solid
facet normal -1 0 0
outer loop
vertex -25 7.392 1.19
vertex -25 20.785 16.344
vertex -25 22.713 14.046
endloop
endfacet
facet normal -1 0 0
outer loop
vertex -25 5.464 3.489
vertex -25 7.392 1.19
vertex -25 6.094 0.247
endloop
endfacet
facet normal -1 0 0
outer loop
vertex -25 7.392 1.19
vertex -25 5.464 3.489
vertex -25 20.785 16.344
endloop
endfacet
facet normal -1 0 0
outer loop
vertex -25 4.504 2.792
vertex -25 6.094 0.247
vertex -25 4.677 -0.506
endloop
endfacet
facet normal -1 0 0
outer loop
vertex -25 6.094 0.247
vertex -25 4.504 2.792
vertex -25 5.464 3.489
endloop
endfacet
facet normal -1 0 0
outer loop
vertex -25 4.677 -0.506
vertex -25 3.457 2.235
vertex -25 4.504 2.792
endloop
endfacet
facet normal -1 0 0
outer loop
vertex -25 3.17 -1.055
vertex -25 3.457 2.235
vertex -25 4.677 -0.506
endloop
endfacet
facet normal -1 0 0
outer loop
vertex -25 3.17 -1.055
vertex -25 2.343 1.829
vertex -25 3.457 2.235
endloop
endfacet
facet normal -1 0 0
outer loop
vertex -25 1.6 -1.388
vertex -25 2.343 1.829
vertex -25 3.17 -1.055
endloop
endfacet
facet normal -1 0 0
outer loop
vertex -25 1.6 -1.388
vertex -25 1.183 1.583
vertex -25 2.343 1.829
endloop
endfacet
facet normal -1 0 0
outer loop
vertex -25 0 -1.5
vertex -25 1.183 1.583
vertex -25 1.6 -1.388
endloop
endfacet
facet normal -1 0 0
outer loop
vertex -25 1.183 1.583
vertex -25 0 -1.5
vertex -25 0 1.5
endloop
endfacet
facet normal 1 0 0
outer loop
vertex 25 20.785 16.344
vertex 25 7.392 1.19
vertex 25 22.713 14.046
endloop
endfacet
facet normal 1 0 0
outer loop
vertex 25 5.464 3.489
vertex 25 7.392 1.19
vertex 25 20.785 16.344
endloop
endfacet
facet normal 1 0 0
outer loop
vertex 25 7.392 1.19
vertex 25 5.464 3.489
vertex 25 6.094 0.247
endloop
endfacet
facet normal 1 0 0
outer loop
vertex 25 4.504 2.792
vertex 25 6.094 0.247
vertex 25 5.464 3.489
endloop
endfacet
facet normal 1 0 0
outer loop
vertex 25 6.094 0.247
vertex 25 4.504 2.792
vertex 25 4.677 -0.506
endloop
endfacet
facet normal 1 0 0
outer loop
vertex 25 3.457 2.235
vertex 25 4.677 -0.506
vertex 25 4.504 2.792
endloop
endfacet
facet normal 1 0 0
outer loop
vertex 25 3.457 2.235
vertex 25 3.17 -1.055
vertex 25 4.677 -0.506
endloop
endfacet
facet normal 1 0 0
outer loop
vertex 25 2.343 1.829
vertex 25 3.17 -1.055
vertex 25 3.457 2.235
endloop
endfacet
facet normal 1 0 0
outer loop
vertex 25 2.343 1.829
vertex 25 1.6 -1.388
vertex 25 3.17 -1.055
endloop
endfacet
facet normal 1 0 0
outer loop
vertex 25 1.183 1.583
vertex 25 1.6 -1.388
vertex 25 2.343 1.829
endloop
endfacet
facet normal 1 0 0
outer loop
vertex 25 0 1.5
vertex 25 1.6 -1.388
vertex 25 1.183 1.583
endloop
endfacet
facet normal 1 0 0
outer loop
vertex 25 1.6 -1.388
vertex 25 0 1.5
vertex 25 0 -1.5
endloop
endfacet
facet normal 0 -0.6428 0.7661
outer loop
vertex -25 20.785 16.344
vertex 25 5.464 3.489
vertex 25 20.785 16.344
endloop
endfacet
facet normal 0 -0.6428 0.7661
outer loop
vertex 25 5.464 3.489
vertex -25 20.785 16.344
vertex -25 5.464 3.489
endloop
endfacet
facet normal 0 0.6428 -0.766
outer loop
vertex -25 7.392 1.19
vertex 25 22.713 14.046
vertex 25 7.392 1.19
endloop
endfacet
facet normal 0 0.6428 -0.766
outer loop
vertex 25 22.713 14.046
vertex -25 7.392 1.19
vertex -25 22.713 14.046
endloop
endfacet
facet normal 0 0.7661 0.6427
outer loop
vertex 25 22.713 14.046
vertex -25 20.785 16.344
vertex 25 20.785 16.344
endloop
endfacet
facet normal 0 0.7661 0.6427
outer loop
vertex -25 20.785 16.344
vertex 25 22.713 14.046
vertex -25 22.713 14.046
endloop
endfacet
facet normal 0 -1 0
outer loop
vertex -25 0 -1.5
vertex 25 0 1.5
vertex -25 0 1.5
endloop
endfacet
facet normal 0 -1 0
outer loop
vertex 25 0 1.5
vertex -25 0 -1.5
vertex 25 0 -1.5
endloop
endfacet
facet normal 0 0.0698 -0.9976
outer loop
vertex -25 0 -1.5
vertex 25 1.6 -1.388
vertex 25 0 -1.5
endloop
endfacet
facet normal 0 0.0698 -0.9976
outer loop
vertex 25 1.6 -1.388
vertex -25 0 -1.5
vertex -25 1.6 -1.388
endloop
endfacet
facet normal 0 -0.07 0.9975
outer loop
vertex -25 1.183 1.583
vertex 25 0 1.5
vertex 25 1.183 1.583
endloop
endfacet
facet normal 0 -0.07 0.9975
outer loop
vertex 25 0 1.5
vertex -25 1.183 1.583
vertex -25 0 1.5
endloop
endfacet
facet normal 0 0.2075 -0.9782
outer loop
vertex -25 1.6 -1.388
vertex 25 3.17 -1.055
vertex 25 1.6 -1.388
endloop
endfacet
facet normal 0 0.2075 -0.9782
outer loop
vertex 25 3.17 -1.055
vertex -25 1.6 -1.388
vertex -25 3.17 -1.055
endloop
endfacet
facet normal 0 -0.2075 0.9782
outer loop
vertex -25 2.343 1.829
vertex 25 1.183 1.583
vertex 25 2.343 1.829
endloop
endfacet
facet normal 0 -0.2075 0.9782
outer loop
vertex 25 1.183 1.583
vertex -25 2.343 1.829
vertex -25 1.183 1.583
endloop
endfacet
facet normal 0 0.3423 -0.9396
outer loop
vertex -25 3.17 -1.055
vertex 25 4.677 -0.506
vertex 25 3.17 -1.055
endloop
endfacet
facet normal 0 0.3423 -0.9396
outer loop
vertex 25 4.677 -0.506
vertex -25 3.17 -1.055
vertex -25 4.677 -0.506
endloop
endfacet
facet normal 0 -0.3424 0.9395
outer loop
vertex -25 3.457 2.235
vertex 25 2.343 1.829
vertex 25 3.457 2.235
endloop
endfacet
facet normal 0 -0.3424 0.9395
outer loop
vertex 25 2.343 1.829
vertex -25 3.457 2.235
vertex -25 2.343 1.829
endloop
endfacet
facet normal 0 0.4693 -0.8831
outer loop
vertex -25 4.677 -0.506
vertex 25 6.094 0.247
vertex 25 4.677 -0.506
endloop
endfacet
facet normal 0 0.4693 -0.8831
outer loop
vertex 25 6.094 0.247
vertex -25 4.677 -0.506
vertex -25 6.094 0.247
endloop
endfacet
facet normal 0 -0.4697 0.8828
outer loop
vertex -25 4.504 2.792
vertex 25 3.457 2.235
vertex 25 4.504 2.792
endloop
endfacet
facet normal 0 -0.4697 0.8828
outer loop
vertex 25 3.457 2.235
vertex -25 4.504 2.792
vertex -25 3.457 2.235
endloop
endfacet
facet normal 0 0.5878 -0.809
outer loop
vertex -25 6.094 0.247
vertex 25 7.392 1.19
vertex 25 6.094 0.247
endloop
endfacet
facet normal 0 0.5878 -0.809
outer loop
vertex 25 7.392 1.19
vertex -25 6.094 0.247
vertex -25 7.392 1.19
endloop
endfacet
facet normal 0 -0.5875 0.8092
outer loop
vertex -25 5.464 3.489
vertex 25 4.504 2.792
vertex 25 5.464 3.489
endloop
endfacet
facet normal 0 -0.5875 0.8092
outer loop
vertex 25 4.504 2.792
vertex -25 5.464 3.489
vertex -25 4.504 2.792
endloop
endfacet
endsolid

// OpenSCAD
// bend modifier
// bends an child object along the x-axis
// size: size of the child object to be bend
// angle: angle to bend the object, negative angles bend down
// radius: bend radius, if center= false is measured on the outer if center=true is measured on the mid
// center=true: bend relative to the childrens center
// center=false: bend relative to the childrens lower left edge
// flatten: calculates only the stretched length of the bend and adds a cube accordingly
/*[test]*/
cntr=true;
ang=40;
flt=false;

$fn=50;

bend(size=[50,20,3],angle=ang,flatten=flt,center=cntr) 
  translate([0,0,0]) 
    cube([50,20,3],cntr);

module bend(size=[50,20,2],angle=45,radius=10,center=false, flatten=false){
  alpha=angle*PI/180; //convert in RAD
  strLngth=abs(radius*alpha);
  i = (angle<0) ? -1 : 1;
  
  
  bendOffset1= (center) ? [-size.z/2,0,0] : [-size.z,0,0];
  bendOffset2= (center) ? [0,0,-size.x/2] : [size.z/2,0,-size.x/2];
  bendOffset3= (center) ? [0,0,0] : [size.x/2,0,size.z/2];
  
  childOffset1= (center) ? [0,size.y/2,0] : [0,0,size.z/2*i-size.z/2];
  childOffset2= (angle<0 && !center) ? [0,0,size.z] : [0,0,0]; //check
  
  flatOffsetChld= (center) ? [0,size.y/2+strLngth,0] : [0,strLngth,0];  
  flatOffsetCb= (center) ? [0,strLngth/2,0] : [0,0,0];  
  
  angle=abs(angle);
  
  if (flatten){
    translate(flatOffsetChld) children();
    translate(flatOffsetCb) cube([size.x,strLngth,size.z],center);
  }
  else{
    //move child objects
    translate([0,0,i*radius]+childOffset2) //checked for cntr+/-, cntrN+
      rotate([i*angle,0,0]) 
      translate([0,0,i*-radius]+childOffset1) //check
        children();
    //create bend object
    
    translate(bendOffset3) //checked for cntr+/-, cntrN+/-
      rotate([0,i*90,0]) //re-orientate bend
       translate([-radius,0,0]+bendOffset2)
        rotate_extrude(angle=angle) 
          translate([radius,0,0]+bendOffset1) square([size.z,size.x]);
  }
}
